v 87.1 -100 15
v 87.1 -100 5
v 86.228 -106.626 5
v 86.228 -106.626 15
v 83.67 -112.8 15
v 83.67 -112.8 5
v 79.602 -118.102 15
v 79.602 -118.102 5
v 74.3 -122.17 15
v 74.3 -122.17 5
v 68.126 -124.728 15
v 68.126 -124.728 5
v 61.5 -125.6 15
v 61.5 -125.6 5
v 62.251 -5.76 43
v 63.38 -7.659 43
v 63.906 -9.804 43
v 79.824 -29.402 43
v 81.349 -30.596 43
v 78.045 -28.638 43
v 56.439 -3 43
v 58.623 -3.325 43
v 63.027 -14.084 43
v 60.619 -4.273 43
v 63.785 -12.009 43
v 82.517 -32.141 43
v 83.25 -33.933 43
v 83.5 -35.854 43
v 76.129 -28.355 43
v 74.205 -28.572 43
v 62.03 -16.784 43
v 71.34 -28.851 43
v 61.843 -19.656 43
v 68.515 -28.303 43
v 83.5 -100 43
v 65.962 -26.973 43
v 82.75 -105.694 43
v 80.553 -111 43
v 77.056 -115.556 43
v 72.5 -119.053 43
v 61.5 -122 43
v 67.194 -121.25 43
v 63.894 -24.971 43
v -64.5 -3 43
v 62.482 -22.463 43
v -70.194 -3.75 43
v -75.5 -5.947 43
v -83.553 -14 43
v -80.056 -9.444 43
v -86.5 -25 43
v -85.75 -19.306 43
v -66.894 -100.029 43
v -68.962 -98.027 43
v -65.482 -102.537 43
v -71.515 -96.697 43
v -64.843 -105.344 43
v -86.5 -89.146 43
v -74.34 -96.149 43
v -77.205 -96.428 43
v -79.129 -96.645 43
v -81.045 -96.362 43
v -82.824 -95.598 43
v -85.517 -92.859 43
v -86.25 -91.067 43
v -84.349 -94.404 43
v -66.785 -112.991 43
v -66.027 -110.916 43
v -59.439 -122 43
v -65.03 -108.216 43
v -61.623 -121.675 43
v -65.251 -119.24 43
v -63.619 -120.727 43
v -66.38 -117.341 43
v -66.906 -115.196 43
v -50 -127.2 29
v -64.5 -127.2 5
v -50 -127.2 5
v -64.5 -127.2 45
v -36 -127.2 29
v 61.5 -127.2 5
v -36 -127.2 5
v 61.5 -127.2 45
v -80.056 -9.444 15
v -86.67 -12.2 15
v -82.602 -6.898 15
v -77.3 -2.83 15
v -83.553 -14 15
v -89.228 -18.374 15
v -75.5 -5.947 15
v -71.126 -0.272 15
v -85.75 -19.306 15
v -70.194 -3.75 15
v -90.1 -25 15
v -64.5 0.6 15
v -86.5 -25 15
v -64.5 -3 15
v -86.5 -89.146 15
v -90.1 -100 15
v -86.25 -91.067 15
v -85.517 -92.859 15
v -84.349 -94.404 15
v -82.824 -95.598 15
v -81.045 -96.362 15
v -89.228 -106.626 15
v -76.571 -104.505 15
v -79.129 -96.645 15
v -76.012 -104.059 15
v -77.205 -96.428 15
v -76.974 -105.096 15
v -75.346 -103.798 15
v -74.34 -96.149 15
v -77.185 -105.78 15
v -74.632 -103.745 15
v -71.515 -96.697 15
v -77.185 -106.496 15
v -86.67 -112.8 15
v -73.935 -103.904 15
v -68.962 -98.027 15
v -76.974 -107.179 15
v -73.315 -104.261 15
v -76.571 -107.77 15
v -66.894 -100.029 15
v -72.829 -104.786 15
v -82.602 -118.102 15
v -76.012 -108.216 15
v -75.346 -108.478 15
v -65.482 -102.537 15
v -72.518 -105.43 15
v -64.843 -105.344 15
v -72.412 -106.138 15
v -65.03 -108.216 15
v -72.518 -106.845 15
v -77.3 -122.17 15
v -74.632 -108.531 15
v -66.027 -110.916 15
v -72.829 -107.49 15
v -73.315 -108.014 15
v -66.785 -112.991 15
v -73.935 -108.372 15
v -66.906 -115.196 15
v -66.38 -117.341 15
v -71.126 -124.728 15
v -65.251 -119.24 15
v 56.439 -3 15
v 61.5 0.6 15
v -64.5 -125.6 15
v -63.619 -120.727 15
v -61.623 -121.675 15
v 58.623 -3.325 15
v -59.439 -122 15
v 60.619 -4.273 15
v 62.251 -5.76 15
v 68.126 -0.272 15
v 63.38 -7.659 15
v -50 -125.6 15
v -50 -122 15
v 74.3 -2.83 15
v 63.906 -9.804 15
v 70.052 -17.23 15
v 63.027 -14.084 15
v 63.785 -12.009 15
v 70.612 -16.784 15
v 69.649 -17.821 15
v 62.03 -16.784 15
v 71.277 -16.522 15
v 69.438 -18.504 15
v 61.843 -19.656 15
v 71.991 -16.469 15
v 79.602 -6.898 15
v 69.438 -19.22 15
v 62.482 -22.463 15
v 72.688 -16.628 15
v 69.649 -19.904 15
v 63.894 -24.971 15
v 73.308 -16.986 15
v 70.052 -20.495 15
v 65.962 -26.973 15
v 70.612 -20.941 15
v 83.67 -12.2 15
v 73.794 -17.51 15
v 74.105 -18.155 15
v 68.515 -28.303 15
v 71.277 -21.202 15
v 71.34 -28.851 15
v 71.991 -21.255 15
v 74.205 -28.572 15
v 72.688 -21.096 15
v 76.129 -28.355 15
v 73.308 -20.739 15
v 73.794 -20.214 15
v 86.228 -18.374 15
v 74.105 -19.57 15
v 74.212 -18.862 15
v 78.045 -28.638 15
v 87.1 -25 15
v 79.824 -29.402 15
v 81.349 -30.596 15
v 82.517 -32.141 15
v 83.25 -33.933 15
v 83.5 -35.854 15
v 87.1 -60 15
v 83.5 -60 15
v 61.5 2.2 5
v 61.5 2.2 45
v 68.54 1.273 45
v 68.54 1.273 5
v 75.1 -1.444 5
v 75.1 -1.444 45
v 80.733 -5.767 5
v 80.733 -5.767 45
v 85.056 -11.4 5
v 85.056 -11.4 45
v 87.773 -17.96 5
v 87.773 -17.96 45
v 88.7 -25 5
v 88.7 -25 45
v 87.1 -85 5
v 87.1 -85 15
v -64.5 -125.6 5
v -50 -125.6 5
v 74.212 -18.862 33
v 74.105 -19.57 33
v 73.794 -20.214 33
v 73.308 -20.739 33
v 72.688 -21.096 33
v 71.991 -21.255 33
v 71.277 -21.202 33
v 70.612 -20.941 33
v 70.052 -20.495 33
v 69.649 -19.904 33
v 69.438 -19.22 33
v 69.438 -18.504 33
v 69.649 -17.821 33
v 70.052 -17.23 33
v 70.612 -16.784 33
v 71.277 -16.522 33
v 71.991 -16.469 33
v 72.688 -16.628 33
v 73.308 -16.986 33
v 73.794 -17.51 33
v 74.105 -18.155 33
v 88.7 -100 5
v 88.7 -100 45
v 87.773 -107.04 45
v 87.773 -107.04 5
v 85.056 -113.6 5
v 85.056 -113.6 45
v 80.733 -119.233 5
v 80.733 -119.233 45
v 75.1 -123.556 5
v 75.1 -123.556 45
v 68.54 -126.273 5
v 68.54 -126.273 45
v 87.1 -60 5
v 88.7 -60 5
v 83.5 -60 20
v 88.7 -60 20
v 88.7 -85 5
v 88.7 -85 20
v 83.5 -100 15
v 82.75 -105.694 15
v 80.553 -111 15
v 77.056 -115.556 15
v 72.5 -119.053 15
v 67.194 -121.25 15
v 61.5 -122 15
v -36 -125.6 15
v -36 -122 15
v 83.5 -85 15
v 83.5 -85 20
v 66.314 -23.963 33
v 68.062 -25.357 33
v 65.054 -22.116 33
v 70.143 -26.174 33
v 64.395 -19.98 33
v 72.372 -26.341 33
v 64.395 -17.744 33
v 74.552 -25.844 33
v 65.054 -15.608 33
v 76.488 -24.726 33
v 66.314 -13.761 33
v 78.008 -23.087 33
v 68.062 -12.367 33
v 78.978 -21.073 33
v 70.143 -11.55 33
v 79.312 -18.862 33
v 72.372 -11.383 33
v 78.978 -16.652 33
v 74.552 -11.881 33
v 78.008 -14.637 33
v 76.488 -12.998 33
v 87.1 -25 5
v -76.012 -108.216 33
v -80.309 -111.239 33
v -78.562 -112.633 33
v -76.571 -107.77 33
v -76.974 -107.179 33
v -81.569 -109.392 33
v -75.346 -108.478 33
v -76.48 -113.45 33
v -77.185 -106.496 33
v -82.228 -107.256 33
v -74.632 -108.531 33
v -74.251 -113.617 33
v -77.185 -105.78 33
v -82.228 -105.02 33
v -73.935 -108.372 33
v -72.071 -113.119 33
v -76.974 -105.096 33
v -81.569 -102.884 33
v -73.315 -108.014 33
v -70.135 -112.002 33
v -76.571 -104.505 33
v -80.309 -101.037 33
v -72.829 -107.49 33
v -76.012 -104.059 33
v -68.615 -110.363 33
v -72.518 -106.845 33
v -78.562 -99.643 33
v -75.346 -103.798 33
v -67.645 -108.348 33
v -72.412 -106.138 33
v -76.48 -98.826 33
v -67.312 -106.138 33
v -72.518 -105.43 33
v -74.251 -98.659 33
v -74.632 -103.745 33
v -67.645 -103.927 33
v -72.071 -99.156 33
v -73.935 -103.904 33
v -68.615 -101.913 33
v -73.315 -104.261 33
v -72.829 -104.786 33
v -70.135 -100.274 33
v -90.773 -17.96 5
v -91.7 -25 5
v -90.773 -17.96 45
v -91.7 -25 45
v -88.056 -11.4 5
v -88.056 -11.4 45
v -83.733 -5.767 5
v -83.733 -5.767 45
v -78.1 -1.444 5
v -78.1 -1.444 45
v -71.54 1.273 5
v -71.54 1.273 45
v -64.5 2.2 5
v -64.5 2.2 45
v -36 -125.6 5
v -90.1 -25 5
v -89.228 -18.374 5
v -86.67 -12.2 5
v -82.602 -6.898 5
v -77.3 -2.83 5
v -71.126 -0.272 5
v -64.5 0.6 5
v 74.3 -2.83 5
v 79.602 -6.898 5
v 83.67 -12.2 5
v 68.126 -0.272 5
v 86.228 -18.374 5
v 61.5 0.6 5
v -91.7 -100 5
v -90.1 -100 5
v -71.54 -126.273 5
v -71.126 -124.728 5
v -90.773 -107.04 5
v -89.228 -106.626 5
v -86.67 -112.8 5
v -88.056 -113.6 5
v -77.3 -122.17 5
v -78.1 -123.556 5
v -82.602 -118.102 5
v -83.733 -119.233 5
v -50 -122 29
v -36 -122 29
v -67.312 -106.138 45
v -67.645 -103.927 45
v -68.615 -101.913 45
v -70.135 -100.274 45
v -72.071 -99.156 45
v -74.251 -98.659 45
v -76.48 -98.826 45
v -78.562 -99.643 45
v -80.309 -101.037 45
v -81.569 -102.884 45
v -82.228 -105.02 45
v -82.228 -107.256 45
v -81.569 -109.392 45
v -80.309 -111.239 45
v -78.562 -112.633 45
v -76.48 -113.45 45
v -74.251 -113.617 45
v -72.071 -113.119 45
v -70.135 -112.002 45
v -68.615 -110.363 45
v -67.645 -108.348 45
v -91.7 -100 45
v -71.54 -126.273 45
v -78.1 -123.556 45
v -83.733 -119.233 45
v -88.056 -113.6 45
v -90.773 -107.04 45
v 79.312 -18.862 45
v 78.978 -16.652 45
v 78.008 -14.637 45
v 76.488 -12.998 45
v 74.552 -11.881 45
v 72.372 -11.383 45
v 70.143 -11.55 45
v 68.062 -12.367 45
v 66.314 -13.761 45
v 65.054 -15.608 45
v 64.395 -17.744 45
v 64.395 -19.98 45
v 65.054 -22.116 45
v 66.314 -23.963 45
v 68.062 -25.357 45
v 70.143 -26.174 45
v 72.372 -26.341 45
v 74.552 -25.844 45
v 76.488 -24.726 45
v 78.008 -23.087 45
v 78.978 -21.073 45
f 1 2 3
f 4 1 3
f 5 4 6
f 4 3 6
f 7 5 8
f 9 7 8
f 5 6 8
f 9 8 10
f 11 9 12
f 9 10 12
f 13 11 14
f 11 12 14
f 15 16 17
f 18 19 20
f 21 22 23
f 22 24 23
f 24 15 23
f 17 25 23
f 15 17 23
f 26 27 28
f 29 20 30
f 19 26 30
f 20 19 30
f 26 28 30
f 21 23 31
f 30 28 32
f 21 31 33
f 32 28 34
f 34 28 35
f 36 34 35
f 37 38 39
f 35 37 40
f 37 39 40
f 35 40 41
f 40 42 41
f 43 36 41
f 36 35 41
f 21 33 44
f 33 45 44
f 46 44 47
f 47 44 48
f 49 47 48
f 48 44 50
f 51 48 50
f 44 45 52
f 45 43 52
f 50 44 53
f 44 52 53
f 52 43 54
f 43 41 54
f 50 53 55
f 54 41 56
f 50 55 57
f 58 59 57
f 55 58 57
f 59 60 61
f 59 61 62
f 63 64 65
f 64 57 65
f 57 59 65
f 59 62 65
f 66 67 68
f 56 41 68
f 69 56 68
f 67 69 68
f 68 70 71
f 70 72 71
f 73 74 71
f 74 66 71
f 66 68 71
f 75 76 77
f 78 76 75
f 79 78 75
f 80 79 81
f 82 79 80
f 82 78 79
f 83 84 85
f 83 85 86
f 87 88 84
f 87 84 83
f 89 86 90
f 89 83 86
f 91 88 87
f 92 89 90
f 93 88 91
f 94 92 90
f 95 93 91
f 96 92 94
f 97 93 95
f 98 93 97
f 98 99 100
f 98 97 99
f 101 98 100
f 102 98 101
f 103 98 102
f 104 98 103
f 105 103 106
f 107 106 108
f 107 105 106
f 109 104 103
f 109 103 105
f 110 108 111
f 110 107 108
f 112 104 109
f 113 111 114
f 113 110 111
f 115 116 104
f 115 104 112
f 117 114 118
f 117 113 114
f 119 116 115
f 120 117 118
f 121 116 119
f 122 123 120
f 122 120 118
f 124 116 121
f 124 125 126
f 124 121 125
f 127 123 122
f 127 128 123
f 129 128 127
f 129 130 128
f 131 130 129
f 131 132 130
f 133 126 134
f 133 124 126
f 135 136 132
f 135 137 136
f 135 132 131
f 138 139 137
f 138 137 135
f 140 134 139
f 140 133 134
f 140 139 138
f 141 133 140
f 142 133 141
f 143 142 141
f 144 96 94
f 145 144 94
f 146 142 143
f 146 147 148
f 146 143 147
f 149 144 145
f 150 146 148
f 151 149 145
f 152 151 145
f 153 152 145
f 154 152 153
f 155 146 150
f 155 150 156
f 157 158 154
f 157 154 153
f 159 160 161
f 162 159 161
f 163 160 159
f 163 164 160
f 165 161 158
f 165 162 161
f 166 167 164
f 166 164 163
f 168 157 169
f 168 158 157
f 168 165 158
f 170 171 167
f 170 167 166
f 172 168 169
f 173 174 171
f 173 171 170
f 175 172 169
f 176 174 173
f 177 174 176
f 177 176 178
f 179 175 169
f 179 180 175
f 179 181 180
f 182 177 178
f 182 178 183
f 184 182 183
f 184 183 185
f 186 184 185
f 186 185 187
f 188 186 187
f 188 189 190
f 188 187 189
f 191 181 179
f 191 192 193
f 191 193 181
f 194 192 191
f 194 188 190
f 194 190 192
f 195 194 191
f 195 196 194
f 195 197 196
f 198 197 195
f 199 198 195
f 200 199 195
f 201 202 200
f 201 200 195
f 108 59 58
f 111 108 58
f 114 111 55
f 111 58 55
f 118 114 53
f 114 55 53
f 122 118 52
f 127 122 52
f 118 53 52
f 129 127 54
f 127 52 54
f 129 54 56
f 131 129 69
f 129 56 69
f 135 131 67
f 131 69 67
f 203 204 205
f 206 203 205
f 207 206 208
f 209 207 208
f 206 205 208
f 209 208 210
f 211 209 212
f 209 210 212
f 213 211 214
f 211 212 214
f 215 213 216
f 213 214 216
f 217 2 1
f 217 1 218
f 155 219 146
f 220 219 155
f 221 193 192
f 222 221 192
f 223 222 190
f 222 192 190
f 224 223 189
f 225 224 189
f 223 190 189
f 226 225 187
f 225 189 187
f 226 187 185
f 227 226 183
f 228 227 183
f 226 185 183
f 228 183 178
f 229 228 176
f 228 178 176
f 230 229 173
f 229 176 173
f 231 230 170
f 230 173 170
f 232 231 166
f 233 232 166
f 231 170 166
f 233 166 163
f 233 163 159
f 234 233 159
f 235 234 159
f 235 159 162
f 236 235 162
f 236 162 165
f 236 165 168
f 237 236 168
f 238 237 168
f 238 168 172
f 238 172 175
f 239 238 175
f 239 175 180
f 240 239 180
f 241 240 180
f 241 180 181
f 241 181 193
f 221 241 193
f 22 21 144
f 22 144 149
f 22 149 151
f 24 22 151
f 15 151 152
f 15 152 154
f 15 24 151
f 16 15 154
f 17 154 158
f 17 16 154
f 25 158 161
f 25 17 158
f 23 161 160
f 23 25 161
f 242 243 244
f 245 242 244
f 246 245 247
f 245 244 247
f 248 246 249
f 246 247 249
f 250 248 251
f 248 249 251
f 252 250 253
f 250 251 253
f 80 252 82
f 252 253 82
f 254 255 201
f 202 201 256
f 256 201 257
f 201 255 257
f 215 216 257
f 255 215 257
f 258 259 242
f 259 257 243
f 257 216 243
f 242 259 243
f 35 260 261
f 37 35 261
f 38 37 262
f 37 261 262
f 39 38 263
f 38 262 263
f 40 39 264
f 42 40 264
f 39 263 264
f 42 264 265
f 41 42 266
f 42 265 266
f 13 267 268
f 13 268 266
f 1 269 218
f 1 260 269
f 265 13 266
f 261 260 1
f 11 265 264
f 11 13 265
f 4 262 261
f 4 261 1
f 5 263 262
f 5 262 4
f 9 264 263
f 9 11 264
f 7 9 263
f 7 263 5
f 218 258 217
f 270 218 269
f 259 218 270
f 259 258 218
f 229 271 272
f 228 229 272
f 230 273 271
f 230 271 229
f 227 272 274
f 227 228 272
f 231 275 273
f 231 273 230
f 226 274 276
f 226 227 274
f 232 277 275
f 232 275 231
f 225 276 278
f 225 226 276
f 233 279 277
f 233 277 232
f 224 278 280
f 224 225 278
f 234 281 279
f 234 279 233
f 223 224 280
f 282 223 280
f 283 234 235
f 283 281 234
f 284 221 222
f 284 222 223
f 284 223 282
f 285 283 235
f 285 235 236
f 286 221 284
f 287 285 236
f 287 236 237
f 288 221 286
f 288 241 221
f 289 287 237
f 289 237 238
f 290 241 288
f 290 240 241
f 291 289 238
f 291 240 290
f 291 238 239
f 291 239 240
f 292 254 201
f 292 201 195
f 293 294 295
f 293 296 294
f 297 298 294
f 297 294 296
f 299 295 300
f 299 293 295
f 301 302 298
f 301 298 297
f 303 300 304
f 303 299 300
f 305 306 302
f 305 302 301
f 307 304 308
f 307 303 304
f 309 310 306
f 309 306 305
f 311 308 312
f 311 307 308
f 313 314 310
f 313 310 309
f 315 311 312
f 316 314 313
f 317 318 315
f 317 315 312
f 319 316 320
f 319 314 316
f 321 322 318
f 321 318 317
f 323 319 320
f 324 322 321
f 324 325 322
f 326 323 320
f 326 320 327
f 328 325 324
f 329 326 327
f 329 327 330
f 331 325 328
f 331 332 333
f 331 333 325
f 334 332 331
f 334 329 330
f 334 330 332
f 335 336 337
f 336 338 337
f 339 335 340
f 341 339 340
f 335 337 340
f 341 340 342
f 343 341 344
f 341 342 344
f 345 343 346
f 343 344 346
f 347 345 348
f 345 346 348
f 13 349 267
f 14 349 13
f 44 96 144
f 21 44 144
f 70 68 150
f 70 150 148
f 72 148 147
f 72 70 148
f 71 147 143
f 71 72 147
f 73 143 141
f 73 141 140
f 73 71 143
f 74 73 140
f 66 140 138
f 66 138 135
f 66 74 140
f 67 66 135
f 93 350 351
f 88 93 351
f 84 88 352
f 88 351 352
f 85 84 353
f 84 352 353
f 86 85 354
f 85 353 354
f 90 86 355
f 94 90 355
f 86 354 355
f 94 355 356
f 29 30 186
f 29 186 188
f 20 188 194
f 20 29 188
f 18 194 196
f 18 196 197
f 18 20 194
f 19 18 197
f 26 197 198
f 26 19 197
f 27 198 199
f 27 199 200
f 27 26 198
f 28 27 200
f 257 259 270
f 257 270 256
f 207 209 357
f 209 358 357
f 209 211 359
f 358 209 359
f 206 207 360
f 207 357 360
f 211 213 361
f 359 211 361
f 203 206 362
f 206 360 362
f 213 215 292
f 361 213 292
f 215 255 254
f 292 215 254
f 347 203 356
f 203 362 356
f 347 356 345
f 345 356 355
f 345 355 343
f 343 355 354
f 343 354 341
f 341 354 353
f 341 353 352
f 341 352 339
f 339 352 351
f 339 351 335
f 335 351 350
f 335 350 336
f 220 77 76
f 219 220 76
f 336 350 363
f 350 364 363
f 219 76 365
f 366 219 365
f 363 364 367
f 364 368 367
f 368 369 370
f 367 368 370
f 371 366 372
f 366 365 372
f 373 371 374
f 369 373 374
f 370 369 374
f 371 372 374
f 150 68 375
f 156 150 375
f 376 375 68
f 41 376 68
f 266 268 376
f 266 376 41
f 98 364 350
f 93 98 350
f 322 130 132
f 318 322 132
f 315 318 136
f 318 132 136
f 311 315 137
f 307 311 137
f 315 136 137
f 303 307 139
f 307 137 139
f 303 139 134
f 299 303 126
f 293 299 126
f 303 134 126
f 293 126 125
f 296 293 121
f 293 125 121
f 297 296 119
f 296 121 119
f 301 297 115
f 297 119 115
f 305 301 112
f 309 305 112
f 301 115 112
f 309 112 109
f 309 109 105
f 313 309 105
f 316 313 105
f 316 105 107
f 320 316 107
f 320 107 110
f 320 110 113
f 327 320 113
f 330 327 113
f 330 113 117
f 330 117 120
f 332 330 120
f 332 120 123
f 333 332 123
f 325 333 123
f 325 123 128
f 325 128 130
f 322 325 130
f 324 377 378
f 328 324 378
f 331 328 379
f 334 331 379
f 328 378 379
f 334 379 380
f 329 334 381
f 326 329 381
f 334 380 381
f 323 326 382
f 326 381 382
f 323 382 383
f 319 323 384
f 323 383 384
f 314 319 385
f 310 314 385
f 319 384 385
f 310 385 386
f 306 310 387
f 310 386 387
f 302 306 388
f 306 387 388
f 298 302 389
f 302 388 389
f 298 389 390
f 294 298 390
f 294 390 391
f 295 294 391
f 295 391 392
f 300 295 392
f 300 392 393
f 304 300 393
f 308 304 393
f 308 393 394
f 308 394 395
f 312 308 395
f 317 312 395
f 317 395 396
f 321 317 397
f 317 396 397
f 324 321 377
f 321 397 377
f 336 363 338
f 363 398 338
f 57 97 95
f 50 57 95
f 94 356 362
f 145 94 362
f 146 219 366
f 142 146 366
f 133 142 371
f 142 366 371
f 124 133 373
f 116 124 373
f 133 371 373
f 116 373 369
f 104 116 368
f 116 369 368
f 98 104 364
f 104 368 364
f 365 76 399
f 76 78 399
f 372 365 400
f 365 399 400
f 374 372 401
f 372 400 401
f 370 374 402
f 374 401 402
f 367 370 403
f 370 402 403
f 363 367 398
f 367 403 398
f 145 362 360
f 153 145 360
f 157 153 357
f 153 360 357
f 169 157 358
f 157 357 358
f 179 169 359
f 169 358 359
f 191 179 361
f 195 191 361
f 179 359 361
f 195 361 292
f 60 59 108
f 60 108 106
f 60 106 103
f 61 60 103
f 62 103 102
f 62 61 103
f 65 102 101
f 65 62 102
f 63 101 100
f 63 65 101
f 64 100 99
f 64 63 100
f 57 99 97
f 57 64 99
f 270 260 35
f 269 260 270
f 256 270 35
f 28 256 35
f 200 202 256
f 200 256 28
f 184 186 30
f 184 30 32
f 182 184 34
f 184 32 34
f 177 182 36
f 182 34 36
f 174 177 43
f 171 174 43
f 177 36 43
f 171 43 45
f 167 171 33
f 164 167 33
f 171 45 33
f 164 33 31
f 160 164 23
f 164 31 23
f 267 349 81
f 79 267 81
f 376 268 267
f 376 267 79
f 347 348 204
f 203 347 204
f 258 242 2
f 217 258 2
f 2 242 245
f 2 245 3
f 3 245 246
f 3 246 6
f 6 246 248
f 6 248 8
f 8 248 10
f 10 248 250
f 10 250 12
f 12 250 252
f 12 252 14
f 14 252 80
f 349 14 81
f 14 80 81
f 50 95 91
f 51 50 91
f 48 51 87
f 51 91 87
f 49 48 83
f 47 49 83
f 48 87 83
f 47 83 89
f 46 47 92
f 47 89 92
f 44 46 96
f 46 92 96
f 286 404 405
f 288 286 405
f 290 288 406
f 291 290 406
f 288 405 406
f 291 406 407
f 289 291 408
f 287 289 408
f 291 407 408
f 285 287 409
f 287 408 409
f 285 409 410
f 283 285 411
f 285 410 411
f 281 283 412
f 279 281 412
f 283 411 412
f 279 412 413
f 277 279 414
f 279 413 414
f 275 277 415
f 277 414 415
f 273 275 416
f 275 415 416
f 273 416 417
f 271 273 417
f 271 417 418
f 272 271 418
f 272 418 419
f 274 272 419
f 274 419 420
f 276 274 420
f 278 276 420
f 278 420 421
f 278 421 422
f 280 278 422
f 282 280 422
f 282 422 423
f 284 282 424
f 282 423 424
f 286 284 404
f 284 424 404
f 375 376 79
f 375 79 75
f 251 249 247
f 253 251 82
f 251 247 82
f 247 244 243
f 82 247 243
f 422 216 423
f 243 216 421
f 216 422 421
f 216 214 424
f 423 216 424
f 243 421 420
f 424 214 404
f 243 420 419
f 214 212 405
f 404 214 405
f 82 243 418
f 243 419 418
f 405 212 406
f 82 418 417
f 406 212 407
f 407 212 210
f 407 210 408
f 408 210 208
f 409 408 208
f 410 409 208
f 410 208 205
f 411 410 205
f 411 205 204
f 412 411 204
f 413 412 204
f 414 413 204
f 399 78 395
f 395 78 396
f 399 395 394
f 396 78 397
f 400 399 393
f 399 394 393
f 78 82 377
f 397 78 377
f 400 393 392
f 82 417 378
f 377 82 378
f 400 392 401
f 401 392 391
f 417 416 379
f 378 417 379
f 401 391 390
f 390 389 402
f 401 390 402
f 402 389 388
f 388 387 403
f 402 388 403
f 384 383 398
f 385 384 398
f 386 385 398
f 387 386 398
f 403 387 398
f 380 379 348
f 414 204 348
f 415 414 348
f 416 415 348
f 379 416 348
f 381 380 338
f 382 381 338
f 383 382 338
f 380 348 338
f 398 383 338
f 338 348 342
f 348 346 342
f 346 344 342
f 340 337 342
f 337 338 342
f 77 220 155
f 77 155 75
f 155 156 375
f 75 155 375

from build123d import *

# Parameters (mm, degrees)
PAD002_DEPTH    = 30
PAD003_DEPTH    = 10
POCKET011_DEPTH = 10
POCKET012_DEPTH = 28
PAD004_DEPTH    = 28
SKETCH018_R     = 2.4
POCKET013_DEPTH = 30.001
SKETCH019_R     = 7.5
POCKET014_DEPTH = 12
SKETCH020_W     = 14
SKETCH020_H     = 40
POCKET015_DEPTH = 5.201
SKETCH021_W     = 25
SKETCH021_H     = 30
POCKET016_DEPTH = 10


with BuildPart() as part:
    # Sketch013 (on Face25 of Binder) → Pad002 (new body)
    with BuildSketch(Plane.XY.offset(15)):
        with BuildLine():
            Line((-64.5, 2.2), (61.5, 2.2))
            ThreePointArc((88.7, -25), (80.733304, -5.766696), (61.5, 2.2))
            Line((88.7, -25), (88.7, -100))
            ThreePointArc((61.5, -127.2), (80.733304, -119.233304), (88.7, -100))
            Line((-64.5, -127.2), (61.5, -127.2))
            ThreePointArc((-91.7, -100), (-83.733304, -119.233304), (-64.5, -127.2))
            Line((-91.7, -25), (-91.7, -100))
            ThreePointArc((-64.5, 2.2), (-83.733304, -5.766696), (-91.7, -25))
        make_face()
    extrude(amount=PAD002_DEPTH)

    # Sketch014 (on Face9 of Pad002) → Pad003 (join)
    with BuildSketch(Plane(origin=(0, 0, 15), x_dir=(1, 0, 0), z_dir=(0, 0, -1))):
        with BuildLine():
            Line((-64.5, 127.2), (61.5, 127.2))
            ThreePointArc((88.7, 100), (80.733304, 119.233304), (61.5, 127.2))
            Line((88.7, 25), (88.7, 100))
            ThreePointArc((61.5, -2.2), (80.733304, 5.766696), (88.7, 25))
            Line((-64.5, -2.2), (61.5, -2.2))
            ThreePointArc((-91.7, 25), (-83.733304, 5.766696), (-64.5, -2.2))
            Line((-91.7, 100), (-91.7, 25))
            ThreePointArc((-64.5, 127.2), (-83.733304, 119.233304), (-91.7, 100))
        make_face()
    extrude(amount=PAD003_DEPTH)

    # Sketch015 (on Face10 of Pad003) → Pocket011 (cut)
    with BuildSketch(Plane(origin=(0, 0, 5), x_dir=(1, 0, 0), z_dir=(0, 0, -1))):
        with BuildLine():
            Line((-64.5, 125.6), (61.5, 125.6))
            ThreePointArc((87.1, 100), (79.601934, 118.101934), (61.5, 125.6))
            Line((87.1, 100), (87.1, 25))
            ThreePointArc((61.5, -0.6), (79.601934, 6.898066), (87.1, 25))
            Line((-64.5, -0.6), (61.5, -0.6))
            ThreePointArc((-90.1, 25), (-82.601934, 6.898066), (-64.5, -0.6))
            Line((-90.1, 100), (-90.1, 25))
            ThreePointArc((-64.5, 125.6), (-82.601934, 118.101934), (-90.1, 100))
        make_face()
    extrude(amount=-POCKET011_DEPTH, mode=Mode.SUBTRACT)

    # Sketch016 (on Face27 of Pocket011) → Pocket012 (cut)
    with BuildSketch(Plane(origin=(0, 0, 15), x_dir=(1, 0, 0), z_dir=(0, 0, -1))):
        with BuildLine():
            Line((-64.5, 122), (61.5, 122))
            ThreePointArc((83.5, 100), (77.056349, 115.556349), (61.5, 122))
            Line((83.5, 100), (83.5, 25))
            ThreePointArc((61.5, 3), (77.056349, 9.443651), (83.5, 25))
            Line((-64.5, 3), (61.5, 3))
            ThreePointArc((-86.5, 25), (-80.056349, 9.443651), (-64.5, 3))
            Line((-86.5, 100), (-86.5, 25))
            ThreePointArc((-64.5, 122), (-80.056349, 115.556349), (-86.5, 100))
        make_face()
    extrude(amount=-POCKET012_DEPTH, mode=Mode.SUBTRACT)

    # Sketch017 (on Face36 of Pocket012) → Pad004 (join)
    with BuildSketch(Plane(origin=(0, 0, 43), x_dir=(1, 0, 0), z_dir=(0, 0, -1))):
        with BuildLine():
            ThreePointArc((-64.5, 122), (-80.056349, 115.556349), (-86.5, 100))
            Line((-86.5, 100), (-86.5, 89.146438))
            ThreePointArc((-77.204935, 96.428453), (-83.625311, 95.050377), (-86.5, 89.146438))
            ThreePointArc((-77.204935, 96.428453), (-66.894122, 100.029214), (-66.027044, 110.916203))
            ThreePointArc((-59.438691, 122), (-65.885724, 118.3322), (-66.027044, 110.916203))
            Line((-64.5, 122), (-59.438691, 122))
        make_face()
        with BuildLine():
            ThreePointArc((61.5, 3), (77.056349, 9.443651), (83.5, 25))
            Line((83.5, 35.853562), (83.5, 25))
            ThreePointArc((74.204935, 28.571547), (80.625311, 29.949623), (83.5, 35.853562))
            ThreePointArc((74.204935, 28.571547), (63.894122, 24.970786), (63.027044, 14.083797))
            ThreePointArc((56.438691, 3), (62.885724, 6.6678), (63.027044, 14.083797))
            Line((56.438691, 3), (61.5, 3))
        make_face()
    extrude(amount=PAD004_DEPTH)

    # Sketch018 (on Face28 of Pad004) → Pocket013 (cut, through all)
    with BuildSketch(Plane(origin=(0, 0, 15), x_dir=(1, 0, 0), z_dir=(0, 0, -1))):
        with Locations((-74.811515, 106.137806)):
            Circle(SKETCH018_R)
        with Locations((71.811515, 18.862194)):
            Circle(SKETCH018_R)
    extrude(amount=-POCKET013_DEPTH, mode=Mode.SUBTRACT)

    # Sketch019 (on Face5 of Pocket013) → Pocket014 (cut)
    with BuildSketch(Plane.XY.offset(45)):
        with Locations((71.811515, -18.862194)):
            Circle(SKETCH019_R)
        with Locations((-74.811515, -106.137806)):
            Circle(SKETCH019_R)
    extrude(amount=-POCKET014_DEPTH, mode=Mode.SUBTRACT)

    # Sketch020 (on Face35 of Pocket014) → Pocket015 (cut, through all)
    with BuildSketch(Plane(origin=(0, -122, 0), x_dir=(-1, 0, 0), z_dir=(0, 1, 0))):
        with Locations((43, 9)):
            Rectangle(SKETCH020_W, SKETCH020_H)
    extrude(amount=-POCKET015_DEPTH, mode=Mode.SUBTRACT)

    # Sketch021 (on Face11 of Pocket015) → Pocket016 (cut)
    with BuildSketch(Plane.YZ.offset(88.7)):
        with Locations((-72.5, 5)):
            Rectangle(SKETCH021_W, SKETCH021_H)
    extrude(amount=-POCKET016_DEPTH, mode=Mode.SUBTRACT)


solid = part.part
